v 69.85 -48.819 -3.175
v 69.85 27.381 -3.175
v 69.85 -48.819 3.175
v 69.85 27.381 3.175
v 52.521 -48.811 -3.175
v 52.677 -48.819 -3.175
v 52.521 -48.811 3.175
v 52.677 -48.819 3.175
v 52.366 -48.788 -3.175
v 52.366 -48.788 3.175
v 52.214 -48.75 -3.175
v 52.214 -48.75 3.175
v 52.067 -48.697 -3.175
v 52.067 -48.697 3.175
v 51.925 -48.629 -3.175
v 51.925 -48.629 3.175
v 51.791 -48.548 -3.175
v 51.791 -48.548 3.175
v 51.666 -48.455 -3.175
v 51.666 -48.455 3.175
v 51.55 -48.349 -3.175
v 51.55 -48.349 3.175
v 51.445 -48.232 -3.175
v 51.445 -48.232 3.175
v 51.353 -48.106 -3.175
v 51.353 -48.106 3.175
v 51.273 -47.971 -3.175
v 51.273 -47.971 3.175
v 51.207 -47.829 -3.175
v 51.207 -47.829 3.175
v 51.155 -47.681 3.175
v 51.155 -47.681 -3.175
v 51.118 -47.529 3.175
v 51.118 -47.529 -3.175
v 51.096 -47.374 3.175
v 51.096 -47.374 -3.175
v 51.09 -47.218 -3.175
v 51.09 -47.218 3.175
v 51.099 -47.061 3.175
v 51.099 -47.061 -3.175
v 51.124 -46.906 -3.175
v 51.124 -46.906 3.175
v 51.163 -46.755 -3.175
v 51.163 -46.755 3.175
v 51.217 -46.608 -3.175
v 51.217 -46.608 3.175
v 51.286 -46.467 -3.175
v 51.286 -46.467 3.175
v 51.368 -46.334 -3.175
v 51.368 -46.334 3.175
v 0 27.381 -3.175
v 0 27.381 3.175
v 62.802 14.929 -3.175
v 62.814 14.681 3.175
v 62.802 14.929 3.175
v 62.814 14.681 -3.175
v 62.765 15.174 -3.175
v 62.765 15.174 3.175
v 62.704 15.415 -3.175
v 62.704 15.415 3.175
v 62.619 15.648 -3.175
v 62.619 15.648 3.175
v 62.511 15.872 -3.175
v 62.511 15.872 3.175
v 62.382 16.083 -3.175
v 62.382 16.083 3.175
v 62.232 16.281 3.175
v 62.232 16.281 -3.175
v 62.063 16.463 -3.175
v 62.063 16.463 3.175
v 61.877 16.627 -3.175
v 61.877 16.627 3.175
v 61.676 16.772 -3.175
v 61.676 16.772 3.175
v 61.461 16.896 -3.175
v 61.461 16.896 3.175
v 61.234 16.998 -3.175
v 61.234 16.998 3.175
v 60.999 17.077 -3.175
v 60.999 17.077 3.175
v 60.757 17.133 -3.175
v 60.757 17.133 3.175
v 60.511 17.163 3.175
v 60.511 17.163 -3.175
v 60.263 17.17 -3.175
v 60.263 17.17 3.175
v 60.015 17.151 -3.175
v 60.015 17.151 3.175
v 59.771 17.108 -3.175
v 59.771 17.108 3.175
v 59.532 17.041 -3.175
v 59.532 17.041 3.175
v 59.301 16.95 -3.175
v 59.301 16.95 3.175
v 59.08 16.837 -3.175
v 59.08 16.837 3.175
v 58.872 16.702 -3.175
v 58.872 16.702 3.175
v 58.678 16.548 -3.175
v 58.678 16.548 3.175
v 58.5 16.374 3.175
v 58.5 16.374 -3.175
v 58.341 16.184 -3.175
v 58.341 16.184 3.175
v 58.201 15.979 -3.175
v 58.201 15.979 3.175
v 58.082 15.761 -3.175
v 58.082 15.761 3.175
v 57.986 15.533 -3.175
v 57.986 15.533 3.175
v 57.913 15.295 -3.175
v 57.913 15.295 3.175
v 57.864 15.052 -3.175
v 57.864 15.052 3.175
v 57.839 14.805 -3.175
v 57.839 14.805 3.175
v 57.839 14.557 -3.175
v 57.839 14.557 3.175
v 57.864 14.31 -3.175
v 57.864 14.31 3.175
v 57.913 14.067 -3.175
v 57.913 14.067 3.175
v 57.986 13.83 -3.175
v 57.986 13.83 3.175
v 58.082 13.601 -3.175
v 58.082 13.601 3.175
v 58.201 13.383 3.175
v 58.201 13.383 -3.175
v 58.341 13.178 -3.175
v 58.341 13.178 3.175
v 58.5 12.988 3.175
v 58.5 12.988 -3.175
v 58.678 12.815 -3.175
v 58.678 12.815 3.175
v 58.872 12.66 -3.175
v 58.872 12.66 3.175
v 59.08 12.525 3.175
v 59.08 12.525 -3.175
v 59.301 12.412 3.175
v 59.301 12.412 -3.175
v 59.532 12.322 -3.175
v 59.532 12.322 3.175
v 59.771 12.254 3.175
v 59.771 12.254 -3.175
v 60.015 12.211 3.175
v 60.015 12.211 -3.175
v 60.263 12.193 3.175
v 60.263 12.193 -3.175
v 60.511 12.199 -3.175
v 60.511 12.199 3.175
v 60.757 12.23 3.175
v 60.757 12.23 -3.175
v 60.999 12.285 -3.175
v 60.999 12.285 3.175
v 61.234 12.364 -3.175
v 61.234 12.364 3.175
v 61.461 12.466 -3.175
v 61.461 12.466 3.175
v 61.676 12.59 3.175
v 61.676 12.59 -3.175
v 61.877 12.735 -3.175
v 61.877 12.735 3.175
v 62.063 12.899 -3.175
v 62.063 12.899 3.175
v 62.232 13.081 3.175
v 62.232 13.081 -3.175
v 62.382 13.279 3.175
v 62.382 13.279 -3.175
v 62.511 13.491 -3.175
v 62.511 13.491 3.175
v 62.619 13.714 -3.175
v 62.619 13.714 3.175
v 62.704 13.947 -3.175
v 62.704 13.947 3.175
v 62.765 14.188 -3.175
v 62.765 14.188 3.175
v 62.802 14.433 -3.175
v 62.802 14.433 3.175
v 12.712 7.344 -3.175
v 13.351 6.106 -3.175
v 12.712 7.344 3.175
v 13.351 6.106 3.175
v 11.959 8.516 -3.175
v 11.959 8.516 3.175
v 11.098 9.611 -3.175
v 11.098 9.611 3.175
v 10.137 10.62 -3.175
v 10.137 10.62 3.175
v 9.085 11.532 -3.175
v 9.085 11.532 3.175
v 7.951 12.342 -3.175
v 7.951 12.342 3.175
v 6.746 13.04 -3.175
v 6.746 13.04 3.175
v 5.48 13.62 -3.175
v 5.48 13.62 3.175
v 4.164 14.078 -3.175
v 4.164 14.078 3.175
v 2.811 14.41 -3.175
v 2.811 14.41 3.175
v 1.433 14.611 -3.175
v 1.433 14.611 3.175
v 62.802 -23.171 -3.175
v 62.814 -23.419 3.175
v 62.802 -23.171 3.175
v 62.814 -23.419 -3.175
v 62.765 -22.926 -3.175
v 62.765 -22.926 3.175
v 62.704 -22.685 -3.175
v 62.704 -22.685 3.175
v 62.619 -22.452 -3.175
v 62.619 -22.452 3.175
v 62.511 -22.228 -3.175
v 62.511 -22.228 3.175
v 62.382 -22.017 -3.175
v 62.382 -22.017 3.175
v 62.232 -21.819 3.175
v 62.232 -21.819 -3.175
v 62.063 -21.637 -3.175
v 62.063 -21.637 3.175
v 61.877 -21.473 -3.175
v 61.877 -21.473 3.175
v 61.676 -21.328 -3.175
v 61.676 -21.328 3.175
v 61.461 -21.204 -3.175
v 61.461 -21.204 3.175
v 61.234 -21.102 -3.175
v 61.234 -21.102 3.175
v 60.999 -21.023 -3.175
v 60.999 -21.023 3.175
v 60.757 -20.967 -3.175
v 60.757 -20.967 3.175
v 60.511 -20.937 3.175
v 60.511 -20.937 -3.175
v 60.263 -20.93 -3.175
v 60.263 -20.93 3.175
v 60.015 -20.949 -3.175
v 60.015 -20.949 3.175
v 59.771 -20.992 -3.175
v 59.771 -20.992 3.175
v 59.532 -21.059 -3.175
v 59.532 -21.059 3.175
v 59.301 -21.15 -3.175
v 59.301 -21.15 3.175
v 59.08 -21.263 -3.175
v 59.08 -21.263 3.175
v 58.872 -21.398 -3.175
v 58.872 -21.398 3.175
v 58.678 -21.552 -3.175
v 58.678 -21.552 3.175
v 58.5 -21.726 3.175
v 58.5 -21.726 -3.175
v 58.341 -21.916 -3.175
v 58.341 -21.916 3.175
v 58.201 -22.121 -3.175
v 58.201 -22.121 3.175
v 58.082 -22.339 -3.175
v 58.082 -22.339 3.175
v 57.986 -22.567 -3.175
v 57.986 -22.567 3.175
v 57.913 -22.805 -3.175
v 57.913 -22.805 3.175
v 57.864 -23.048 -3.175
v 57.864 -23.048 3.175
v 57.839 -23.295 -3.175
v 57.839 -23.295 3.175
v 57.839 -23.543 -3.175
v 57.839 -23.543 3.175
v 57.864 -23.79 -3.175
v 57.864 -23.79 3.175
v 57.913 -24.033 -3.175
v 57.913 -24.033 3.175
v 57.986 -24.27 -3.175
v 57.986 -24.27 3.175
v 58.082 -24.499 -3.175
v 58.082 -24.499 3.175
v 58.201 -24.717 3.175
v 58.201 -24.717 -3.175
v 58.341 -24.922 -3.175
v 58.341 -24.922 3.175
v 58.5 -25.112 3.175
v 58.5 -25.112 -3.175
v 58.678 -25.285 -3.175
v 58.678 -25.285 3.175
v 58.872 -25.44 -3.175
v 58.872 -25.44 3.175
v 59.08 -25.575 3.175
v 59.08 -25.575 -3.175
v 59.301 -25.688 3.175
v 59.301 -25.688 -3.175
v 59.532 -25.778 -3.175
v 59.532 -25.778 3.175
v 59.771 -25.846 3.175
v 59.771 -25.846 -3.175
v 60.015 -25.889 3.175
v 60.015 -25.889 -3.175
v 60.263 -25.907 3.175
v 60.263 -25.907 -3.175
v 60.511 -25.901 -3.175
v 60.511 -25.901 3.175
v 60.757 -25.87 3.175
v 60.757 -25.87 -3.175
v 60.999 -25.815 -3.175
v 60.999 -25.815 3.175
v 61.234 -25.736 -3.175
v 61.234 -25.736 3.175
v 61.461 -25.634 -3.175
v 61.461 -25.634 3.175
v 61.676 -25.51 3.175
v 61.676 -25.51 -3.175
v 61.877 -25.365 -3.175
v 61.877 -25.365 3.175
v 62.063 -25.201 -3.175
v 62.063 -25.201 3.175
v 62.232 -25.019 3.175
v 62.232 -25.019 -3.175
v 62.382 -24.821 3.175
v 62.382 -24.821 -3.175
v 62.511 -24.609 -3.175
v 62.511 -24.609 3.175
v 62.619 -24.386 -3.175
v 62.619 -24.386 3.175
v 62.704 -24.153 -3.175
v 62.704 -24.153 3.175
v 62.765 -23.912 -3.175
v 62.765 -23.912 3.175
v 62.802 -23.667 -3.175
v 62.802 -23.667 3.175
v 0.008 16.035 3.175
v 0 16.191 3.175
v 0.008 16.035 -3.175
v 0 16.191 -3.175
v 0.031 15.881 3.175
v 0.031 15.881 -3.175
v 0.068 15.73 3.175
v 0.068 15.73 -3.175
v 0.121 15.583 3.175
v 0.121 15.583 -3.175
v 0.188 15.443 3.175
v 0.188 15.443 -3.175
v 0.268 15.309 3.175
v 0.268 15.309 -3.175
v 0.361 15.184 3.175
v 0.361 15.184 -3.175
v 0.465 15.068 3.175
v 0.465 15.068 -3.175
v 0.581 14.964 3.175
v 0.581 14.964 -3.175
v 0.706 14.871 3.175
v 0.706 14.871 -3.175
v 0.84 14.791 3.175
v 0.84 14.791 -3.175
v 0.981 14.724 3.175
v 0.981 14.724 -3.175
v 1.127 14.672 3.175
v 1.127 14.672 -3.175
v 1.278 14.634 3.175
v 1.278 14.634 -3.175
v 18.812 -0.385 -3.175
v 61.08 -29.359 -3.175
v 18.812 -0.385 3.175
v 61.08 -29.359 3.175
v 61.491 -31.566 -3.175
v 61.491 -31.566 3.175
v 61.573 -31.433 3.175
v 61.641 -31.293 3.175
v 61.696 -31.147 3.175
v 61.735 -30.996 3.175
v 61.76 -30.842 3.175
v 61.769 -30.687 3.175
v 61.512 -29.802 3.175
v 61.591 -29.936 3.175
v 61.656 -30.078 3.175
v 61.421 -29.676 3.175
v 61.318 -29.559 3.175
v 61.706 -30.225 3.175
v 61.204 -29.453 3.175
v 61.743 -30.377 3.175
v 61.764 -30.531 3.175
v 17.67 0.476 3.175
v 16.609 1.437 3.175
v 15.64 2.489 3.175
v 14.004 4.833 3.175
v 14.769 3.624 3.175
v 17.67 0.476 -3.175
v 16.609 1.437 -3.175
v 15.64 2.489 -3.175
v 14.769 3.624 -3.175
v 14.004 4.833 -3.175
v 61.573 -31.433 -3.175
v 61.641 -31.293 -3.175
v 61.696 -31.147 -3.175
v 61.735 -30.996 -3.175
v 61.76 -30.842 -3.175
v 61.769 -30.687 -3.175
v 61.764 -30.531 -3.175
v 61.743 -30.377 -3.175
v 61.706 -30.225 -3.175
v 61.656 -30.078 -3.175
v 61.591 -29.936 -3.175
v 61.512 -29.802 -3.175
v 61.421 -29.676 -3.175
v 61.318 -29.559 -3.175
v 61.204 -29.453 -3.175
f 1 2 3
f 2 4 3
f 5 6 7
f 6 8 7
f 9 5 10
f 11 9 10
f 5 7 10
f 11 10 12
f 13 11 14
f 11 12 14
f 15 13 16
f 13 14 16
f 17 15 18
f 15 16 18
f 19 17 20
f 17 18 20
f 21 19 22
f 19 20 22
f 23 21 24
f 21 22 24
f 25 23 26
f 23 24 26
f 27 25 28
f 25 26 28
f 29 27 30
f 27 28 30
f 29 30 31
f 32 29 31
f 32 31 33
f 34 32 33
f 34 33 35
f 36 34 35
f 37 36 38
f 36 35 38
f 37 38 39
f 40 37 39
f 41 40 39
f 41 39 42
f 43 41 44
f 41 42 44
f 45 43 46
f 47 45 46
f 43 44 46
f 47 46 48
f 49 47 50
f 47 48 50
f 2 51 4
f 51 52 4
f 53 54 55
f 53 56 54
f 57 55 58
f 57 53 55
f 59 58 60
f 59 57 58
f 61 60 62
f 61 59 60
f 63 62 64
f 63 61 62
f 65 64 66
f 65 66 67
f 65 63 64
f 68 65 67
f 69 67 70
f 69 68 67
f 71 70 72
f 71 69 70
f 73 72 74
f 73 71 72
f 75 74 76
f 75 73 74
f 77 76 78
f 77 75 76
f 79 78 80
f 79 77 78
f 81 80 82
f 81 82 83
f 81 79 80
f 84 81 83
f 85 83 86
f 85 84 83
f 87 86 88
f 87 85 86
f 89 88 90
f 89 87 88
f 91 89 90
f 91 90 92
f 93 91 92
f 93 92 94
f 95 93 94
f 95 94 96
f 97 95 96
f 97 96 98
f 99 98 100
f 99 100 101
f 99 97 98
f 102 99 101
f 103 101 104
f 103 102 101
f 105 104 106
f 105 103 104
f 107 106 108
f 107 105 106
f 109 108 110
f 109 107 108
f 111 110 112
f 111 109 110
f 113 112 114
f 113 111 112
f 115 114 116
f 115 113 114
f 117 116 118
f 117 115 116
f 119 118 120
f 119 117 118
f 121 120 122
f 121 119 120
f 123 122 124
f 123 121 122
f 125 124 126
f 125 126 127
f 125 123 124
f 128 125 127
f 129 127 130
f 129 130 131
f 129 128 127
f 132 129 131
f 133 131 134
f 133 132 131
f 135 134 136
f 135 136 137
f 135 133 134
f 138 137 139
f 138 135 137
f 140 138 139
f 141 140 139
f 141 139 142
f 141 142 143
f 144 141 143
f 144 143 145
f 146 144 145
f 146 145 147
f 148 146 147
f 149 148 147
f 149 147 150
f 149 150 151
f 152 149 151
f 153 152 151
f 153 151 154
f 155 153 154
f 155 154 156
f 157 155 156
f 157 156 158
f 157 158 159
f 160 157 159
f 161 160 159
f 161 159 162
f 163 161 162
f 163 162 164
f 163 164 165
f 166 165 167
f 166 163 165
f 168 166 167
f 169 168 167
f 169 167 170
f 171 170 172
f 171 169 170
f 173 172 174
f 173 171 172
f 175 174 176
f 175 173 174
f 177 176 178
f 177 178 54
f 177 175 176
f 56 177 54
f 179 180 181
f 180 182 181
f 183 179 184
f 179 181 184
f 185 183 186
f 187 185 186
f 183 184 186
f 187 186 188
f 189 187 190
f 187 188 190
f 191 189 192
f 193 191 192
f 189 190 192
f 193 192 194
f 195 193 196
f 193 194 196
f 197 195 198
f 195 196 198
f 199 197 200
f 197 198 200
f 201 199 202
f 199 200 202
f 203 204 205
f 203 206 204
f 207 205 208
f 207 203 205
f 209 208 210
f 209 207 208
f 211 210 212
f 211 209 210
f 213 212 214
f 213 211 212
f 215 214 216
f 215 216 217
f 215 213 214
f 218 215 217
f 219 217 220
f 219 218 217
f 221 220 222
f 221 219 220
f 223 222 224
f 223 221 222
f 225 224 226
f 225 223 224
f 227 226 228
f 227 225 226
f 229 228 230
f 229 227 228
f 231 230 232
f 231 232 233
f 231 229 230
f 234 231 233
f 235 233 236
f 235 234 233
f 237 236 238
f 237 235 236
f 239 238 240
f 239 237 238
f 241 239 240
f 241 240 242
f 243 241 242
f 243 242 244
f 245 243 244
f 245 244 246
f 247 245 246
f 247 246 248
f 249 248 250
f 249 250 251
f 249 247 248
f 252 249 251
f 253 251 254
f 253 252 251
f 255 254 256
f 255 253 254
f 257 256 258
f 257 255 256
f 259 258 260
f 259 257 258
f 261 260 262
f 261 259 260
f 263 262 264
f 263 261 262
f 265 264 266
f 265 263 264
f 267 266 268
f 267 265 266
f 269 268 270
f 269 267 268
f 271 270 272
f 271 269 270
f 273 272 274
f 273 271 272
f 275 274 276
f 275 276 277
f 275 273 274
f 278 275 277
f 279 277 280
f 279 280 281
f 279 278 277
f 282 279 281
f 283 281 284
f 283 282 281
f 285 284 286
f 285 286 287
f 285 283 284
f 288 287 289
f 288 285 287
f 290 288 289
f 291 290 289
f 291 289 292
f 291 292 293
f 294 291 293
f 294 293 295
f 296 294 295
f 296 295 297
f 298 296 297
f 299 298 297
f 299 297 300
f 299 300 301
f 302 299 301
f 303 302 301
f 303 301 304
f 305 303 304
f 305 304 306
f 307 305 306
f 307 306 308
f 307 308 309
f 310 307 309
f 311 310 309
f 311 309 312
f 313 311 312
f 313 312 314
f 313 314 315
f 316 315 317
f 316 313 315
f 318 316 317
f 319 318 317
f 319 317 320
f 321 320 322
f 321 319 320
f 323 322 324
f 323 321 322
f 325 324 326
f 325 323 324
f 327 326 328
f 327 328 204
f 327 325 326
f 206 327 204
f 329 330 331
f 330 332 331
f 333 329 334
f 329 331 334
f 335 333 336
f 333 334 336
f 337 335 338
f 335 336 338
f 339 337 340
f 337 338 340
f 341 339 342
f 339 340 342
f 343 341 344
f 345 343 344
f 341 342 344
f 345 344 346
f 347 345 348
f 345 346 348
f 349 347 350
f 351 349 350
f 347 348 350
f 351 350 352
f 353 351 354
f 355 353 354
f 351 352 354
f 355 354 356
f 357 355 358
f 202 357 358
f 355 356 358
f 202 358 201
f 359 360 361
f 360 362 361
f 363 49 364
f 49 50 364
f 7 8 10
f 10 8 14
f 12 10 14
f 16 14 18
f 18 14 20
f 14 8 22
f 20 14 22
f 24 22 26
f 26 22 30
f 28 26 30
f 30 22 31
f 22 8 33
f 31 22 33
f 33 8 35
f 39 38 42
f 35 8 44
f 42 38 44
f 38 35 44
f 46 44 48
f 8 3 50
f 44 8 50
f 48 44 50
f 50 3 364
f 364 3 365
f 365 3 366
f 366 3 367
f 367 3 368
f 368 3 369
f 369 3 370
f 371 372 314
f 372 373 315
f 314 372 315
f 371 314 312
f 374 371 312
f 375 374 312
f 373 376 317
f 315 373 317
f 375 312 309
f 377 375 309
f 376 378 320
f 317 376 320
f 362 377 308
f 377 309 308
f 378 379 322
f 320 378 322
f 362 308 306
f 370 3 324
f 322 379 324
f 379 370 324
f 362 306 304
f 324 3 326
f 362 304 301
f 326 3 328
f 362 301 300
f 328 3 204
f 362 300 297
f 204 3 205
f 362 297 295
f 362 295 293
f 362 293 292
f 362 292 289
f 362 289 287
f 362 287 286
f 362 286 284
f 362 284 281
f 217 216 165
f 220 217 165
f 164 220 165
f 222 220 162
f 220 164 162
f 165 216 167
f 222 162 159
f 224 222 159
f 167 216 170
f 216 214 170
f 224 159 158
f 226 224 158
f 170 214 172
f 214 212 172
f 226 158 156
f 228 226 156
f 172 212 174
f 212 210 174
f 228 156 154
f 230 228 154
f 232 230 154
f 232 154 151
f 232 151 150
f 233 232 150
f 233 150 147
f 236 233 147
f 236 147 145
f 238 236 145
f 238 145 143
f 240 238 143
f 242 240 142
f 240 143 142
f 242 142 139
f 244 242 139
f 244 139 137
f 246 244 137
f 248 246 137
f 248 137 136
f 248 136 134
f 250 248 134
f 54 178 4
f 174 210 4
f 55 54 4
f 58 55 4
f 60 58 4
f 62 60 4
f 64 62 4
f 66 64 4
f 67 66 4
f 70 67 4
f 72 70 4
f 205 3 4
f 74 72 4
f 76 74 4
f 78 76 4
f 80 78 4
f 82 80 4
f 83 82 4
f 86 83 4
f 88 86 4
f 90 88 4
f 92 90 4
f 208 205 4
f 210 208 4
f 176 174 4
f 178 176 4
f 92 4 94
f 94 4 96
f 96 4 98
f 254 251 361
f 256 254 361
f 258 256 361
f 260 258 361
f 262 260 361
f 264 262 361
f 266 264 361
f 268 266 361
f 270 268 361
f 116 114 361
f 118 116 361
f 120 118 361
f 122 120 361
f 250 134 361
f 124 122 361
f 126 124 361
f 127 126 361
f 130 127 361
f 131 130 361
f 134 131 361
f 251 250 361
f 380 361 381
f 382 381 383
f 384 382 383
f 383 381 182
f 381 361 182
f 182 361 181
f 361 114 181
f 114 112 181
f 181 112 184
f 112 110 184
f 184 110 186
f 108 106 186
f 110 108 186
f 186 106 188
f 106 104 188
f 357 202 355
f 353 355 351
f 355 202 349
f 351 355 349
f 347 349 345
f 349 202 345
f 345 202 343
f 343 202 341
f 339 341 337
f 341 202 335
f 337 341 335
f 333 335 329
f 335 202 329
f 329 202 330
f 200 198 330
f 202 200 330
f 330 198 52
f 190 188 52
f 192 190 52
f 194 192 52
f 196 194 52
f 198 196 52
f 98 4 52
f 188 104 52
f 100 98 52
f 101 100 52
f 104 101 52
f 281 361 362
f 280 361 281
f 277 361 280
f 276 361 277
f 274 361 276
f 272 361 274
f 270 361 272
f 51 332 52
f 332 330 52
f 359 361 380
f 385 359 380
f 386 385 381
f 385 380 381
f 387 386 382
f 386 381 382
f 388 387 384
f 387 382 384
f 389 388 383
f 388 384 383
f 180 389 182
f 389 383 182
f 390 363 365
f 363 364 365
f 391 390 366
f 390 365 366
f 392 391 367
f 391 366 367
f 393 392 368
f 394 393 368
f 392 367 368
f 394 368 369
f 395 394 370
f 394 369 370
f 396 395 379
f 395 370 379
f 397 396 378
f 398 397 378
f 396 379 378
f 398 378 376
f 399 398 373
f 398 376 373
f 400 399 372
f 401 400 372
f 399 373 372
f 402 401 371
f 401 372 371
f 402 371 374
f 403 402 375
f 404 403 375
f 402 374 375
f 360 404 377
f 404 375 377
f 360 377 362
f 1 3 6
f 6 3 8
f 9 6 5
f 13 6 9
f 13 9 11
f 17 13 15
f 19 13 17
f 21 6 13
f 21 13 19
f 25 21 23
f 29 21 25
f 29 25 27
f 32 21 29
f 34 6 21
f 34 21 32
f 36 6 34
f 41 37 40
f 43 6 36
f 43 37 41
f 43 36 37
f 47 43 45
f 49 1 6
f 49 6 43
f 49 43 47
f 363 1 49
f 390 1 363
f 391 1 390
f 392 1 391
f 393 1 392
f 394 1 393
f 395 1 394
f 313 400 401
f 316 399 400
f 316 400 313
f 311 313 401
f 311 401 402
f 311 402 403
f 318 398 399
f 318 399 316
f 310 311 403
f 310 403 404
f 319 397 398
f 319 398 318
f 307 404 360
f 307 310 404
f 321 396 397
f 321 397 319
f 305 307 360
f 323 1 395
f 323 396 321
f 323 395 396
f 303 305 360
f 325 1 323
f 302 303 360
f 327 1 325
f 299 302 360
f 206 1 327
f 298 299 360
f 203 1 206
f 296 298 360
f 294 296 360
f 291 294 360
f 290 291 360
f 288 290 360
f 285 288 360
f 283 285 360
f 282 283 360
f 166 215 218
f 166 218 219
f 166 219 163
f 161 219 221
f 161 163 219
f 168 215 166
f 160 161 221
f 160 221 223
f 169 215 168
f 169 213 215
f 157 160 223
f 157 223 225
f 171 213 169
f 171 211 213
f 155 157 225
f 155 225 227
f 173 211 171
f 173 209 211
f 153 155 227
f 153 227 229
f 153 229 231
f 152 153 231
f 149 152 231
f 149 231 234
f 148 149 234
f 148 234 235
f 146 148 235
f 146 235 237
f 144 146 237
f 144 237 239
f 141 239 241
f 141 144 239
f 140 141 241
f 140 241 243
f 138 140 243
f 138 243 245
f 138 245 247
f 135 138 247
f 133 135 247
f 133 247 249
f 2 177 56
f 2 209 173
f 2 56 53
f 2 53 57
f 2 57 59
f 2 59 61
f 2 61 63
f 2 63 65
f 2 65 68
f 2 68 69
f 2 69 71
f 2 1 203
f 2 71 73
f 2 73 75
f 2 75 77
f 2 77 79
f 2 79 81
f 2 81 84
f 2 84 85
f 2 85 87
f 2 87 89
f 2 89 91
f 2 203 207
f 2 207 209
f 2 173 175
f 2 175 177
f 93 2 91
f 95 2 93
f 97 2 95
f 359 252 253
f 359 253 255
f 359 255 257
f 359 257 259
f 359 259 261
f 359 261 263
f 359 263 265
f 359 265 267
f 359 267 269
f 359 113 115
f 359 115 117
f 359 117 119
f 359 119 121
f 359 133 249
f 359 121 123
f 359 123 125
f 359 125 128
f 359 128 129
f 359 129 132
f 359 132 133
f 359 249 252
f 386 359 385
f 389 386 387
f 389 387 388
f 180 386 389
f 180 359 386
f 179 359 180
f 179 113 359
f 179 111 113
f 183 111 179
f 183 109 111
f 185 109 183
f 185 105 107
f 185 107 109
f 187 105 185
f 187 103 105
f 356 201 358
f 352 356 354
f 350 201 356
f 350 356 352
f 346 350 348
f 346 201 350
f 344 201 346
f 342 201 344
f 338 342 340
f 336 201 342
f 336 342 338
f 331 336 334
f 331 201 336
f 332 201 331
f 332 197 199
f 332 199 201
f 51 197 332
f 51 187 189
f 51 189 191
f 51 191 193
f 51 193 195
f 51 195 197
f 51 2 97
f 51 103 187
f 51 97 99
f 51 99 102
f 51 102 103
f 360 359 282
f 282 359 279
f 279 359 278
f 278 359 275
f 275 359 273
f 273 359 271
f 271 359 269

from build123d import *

# Parameters (mm, degrees)
SKETCH1_R           = 2.4892
BOSS_EXTRUDE1_DEPTH = 3.175
FILLET1_R           = 1.5875


with BuildPart() as part:
    # Sketch1 → Boss-Extrude1 (new, symmetric)
    with BuildSketch(Plane.XY):
        with BuildLine():
            ThreePointArc((18.812153865, -0.385081668), (15.640023815, 2.489031981), (13.351109218, 6.106186705))
            ThreePointArc((13.351109218, 6.106186705), (7.933835302, 12.352809027), (0, 14.6812))
            Line((0, 14.6812), (0, 27.3812))
            Line((0, 27.3812), (69.85, 27.3812))
            Line((69.85, 27.3812), (69.85, -48.8188))
            Line((69.85, -48.8188), (49.664583845, -48.8188))
            Line((49.664583845, -48.8188), (62.388915679, -30.256239225))
            Line((62.388915679, -30.256239225), (18.812153865, -0.385081668))
        make_face()
        with Locations((60.325, -23.4188)):
            Circle(SKETCH1_R, mode=Mode.SUBTRACT)
        with Locations((60.325, 14.6812)):
            Circle(SKETCH1_R, mode=Mode.SUBTRACT)
    extrude(amount=BOSS_EXTRUDE1_DEPTH, both=True)

    # Fillet1
    fillet1_edges = [part.edges().sort_by_distance(p)[0] for p in [
        (0, 14.6812, 0),
        (49.664583845, -48.8188, 0),
        (62.388915679, -30.256239225, 0),
    ]]
    fillet(fillet1_edges, radius=FILLET1_R)


solid = part.part
